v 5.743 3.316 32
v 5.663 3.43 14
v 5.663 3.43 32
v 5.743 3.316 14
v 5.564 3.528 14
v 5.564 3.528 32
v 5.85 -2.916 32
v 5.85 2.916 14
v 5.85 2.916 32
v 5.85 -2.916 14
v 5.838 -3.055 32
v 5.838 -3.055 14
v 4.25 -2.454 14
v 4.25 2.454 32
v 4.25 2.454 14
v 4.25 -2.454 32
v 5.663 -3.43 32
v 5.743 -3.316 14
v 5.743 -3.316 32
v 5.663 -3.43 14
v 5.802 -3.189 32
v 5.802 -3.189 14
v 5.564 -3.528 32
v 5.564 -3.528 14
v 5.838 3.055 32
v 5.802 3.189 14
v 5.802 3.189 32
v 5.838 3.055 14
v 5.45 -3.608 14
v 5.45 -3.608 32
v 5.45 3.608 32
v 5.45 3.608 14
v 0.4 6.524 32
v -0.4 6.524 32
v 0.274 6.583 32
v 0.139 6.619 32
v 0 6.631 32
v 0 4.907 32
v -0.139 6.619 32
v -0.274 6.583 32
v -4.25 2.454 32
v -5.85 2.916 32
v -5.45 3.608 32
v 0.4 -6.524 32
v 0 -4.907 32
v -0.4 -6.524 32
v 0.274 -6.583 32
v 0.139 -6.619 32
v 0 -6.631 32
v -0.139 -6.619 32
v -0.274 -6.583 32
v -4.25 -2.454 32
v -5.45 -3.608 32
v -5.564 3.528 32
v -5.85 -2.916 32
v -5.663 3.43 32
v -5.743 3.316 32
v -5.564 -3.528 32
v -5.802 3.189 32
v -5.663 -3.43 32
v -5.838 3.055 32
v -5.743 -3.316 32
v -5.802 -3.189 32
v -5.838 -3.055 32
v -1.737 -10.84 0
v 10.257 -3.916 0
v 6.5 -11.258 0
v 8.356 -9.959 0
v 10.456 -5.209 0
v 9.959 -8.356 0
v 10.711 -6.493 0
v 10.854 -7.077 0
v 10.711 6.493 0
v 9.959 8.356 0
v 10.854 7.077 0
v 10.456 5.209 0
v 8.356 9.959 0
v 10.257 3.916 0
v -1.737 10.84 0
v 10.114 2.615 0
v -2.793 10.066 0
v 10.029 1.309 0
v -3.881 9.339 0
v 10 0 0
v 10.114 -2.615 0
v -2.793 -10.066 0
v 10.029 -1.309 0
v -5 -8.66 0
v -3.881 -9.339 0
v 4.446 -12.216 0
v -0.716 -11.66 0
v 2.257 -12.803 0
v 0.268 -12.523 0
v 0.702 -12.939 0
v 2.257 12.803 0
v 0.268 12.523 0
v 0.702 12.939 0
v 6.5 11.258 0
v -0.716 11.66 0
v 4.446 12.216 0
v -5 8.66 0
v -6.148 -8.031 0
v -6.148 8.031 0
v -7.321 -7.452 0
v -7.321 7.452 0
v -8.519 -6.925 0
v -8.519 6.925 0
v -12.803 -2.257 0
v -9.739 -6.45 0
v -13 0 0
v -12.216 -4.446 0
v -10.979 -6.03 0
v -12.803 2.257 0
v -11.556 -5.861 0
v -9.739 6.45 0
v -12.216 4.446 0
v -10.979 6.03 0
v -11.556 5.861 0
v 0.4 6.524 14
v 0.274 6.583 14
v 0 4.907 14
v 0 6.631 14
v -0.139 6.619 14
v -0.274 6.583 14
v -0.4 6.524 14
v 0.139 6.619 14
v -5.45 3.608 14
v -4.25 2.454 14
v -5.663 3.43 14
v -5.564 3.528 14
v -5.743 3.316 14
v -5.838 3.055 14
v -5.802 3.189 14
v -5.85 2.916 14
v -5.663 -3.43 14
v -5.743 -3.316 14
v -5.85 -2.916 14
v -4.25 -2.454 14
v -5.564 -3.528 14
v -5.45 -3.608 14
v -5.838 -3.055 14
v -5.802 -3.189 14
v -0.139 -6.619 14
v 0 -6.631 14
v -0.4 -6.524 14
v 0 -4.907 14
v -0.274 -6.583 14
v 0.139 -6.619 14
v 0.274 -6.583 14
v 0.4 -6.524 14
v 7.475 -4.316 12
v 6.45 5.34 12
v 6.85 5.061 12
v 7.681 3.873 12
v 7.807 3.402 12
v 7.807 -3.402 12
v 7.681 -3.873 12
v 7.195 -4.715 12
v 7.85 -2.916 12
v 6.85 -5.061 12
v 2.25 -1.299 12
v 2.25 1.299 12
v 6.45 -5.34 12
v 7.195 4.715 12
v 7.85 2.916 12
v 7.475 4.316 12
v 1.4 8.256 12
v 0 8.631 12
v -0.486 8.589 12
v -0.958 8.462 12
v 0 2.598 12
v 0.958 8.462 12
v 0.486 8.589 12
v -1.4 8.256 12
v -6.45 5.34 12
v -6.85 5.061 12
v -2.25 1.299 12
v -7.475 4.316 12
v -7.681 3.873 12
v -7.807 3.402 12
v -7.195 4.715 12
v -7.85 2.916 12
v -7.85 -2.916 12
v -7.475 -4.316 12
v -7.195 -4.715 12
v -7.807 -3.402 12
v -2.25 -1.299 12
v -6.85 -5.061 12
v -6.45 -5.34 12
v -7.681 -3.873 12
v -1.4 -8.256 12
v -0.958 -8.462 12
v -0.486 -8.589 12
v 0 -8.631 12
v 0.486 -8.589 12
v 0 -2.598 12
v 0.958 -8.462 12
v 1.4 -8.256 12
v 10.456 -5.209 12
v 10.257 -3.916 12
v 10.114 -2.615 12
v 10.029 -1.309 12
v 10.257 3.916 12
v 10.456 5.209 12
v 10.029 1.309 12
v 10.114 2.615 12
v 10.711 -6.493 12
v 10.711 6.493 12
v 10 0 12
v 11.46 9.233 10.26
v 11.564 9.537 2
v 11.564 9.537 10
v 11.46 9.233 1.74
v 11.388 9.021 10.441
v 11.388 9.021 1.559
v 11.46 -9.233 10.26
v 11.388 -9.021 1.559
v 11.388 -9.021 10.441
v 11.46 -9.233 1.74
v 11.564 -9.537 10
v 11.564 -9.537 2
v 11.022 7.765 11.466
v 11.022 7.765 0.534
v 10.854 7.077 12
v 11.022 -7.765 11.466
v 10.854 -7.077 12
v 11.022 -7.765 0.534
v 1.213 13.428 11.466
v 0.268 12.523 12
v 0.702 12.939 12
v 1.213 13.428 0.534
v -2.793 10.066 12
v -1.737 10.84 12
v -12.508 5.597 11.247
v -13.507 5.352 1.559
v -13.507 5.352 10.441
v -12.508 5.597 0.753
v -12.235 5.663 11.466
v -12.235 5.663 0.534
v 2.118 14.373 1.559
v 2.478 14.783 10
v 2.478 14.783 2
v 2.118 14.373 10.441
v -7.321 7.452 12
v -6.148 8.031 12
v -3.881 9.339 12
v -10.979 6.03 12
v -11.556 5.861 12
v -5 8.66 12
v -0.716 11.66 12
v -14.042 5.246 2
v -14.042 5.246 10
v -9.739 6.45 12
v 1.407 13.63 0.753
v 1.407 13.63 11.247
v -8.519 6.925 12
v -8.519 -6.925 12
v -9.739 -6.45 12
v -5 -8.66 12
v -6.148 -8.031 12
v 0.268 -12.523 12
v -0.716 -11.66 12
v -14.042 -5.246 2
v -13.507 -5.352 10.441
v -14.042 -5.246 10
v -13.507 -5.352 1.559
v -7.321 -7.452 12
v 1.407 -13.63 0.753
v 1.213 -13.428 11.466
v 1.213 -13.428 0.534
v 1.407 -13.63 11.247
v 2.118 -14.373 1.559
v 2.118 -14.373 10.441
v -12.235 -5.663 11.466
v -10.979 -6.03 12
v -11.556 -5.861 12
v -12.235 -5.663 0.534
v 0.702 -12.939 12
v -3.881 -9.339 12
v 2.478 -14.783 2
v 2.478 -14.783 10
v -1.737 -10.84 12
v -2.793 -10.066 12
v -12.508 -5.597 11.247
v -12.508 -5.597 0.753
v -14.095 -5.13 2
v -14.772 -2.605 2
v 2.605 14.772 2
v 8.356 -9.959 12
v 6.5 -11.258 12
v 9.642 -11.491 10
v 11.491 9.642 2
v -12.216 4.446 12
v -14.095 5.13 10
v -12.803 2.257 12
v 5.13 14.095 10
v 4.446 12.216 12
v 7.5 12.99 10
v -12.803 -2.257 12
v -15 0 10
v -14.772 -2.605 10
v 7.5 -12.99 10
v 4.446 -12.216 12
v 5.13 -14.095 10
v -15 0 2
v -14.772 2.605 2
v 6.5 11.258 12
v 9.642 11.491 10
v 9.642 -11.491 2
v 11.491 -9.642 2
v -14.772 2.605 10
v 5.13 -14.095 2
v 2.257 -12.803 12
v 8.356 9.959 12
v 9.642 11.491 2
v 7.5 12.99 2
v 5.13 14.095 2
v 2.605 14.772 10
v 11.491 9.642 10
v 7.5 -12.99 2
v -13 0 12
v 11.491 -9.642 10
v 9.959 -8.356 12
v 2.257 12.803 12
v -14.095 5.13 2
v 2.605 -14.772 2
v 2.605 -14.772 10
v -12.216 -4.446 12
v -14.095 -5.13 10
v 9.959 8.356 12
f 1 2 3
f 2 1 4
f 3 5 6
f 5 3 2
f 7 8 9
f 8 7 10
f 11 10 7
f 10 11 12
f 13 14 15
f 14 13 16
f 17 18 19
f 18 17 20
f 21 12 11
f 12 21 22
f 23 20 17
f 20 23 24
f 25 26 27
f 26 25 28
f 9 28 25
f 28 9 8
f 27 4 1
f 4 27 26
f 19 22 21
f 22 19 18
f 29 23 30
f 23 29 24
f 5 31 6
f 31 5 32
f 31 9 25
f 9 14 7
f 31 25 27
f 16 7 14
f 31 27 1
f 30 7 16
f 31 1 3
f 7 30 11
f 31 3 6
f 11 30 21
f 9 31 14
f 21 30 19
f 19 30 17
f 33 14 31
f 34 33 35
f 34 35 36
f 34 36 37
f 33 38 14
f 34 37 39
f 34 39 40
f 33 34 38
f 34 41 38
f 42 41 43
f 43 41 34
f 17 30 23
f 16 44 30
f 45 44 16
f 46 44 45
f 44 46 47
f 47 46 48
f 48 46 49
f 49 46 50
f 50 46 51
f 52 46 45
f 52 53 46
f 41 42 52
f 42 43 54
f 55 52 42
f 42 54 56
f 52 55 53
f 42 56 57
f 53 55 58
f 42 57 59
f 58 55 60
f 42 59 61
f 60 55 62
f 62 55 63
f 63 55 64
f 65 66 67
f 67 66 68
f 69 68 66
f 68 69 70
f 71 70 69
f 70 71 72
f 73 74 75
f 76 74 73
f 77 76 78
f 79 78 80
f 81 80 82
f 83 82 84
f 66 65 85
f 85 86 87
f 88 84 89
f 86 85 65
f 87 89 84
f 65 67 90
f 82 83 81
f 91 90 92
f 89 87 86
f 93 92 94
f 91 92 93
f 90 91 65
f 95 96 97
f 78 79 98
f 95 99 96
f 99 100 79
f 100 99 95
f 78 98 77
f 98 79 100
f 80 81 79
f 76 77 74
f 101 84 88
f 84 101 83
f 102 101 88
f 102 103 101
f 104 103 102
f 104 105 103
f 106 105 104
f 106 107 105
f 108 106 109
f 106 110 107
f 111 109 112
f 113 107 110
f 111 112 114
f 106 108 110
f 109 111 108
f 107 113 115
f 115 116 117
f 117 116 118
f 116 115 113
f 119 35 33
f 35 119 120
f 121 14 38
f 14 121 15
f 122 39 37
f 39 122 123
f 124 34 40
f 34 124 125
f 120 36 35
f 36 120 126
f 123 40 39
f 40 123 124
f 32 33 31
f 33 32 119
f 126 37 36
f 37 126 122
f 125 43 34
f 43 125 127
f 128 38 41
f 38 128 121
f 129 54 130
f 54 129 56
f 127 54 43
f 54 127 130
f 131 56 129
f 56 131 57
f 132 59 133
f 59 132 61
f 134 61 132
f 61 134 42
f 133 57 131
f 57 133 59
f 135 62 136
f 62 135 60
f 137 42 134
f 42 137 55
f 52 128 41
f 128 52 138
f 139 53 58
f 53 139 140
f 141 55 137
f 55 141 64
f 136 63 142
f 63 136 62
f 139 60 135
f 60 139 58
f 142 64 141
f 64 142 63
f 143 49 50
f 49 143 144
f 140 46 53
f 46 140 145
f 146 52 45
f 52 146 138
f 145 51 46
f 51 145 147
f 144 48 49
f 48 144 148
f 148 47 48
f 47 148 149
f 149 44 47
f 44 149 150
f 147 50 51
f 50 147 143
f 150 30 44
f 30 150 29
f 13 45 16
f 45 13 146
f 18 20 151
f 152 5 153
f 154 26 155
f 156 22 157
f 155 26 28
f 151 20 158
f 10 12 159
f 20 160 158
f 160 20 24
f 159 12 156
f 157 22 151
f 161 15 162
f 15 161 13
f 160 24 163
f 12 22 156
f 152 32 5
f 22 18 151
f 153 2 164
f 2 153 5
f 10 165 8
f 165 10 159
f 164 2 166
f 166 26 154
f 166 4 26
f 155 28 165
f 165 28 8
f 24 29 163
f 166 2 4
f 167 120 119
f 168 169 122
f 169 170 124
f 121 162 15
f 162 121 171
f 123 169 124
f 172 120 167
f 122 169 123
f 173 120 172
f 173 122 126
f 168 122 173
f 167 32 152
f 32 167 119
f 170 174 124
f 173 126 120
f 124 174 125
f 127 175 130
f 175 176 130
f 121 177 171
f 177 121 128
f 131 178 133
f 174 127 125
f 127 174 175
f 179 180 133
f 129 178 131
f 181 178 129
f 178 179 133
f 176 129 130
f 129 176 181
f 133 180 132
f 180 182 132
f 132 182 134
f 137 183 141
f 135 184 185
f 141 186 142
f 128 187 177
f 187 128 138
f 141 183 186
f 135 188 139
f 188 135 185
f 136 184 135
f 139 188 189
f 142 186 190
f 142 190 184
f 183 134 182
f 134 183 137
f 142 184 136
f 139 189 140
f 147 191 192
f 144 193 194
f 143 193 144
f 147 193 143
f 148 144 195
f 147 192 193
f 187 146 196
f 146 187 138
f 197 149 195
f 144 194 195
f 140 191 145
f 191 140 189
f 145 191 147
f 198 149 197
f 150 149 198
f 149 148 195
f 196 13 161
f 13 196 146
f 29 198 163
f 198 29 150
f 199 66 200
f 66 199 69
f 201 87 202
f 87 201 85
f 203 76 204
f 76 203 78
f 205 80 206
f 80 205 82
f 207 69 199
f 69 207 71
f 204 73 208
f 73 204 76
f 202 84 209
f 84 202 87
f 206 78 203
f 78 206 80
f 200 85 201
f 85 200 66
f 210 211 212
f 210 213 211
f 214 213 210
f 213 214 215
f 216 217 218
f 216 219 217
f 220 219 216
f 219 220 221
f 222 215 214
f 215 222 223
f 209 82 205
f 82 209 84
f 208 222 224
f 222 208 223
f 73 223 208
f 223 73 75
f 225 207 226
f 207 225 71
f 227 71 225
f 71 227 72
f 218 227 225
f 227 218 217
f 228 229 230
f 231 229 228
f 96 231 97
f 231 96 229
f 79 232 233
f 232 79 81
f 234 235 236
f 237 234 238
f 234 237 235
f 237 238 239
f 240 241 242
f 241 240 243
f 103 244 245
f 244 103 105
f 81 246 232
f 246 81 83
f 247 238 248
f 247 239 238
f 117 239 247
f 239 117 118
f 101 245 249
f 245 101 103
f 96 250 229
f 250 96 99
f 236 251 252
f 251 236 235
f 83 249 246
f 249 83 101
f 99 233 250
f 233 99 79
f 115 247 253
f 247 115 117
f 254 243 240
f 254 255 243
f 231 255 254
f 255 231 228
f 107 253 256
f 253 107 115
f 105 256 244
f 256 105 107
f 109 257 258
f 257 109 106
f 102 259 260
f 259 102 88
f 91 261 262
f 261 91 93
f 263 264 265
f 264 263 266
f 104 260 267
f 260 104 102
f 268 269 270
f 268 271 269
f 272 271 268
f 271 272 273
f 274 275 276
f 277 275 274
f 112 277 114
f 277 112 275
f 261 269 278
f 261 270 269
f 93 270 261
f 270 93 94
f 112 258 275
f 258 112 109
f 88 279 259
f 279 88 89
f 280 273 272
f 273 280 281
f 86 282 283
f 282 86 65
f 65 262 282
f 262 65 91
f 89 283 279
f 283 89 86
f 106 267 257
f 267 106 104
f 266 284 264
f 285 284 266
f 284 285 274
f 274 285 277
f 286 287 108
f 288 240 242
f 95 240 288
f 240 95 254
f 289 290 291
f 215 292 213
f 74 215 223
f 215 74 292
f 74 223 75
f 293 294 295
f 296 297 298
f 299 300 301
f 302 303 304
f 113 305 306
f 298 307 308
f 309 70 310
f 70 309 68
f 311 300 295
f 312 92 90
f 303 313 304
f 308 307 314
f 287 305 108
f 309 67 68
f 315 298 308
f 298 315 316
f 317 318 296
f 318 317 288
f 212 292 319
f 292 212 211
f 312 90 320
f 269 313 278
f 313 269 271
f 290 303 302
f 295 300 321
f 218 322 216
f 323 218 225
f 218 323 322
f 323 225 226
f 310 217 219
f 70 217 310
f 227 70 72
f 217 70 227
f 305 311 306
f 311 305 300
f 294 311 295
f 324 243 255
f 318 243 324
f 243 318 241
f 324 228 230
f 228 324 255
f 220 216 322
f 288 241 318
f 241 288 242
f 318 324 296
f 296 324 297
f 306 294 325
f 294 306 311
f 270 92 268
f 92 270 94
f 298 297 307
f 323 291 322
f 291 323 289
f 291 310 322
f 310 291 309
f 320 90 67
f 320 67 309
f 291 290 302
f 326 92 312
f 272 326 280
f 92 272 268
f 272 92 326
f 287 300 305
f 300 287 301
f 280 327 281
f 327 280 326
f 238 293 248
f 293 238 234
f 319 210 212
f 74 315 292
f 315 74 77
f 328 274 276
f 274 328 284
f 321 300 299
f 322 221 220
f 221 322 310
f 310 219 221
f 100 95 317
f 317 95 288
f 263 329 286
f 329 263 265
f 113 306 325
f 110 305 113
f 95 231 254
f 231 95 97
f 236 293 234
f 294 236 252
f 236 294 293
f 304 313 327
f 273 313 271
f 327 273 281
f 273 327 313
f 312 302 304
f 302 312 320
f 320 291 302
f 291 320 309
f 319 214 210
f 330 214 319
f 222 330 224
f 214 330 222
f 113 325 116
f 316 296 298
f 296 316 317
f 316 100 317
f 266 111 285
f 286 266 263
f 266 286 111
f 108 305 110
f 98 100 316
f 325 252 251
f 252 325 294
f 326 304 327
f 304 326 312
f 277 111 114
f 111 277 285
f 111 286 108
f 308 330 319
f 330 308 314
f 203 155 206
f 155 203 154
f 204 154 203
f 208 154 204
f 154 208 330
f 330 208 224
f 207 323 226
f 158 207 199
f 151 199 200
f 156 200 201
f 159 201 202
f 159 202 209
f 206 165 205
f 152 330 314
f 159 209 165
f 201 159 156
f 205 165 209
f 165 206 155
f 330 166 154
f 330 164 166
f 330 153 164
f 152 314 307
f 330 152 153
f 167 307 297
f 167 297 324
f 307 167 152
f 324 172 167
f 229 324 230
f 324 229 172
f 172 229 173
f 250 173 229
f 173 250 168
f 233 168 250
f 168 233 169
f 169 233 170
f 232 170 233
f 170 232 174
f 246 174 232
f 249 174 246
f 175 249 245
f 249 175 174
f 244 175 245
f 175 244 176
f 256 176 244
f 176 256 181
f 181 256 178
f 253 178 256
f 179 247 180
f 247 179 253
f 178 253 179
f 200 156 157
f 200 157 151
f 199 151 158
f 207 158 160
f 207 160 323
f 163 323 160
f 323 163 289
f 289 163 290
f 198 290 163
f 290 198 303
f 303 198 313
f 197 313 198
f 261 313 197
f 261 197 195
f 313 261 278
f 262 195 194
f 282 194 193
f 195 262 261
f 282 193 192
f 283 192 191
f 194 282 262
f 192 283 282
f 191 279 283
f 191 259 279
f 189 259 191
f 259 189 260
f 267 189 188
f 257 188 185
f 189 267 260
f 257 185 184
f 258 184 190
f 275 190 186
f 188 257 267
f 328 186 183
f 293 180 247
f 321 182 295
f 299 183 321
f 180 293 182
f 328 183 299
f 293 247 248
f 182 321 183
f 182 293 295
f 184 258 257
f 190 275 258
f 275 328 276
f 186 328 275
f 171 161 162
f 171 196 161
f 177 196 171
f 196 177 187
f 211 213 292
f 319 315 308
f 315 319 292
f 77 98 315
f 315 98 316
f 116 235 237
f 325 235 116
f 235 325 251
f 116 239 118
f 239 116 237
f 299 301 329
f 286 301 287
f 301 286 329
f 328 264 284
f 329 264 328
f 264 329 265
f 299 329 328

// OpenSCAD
$fn=36;

wt = 0.8;

for(i=[0:5]) rotate([0,0,i*60]) hull() {
    translate([4+wt+0.25,(4+wt+0.25)*tan(30),0]) cylinder(r=wt,h=12+20);
    translate([4+wt+0.25,-(4+wt+0.25)*tan(30),0]) cylinder(r=wt,h=12+20);
}
for(i=[0:5]) rotate([0,0,i*60]) hull() {
    translate([4+wt+0.25,(4+wt+0.25)*tan(30),0]) cylinder(r=wt+2,h=12);
    translate([4+wt+0.25,-(4+wt+0.25)*tan(30),0]) cylinder(r=wt+2,h=12);
        
    translate([4+wt+0.25,(4+wt+0.25)*tan(30),0]) cylinder(r=wt,h=12+2);
    translate([4+wt+0.25,-(4+wt+0.25)*tan(30),0]) cylinder(r=wt,h=12+2);
}
difference() {
    hull() {
        cylinder(r=15-2,h=12);
        translate([0,0,2]) cylinder(r=15,h=12-4);
    }
    for(i=[0:2]) rotate([0,0,i*120]) translate([10+30,0,-1]) cylinder(r=30,h=20,$fn=$fn*4);
}
